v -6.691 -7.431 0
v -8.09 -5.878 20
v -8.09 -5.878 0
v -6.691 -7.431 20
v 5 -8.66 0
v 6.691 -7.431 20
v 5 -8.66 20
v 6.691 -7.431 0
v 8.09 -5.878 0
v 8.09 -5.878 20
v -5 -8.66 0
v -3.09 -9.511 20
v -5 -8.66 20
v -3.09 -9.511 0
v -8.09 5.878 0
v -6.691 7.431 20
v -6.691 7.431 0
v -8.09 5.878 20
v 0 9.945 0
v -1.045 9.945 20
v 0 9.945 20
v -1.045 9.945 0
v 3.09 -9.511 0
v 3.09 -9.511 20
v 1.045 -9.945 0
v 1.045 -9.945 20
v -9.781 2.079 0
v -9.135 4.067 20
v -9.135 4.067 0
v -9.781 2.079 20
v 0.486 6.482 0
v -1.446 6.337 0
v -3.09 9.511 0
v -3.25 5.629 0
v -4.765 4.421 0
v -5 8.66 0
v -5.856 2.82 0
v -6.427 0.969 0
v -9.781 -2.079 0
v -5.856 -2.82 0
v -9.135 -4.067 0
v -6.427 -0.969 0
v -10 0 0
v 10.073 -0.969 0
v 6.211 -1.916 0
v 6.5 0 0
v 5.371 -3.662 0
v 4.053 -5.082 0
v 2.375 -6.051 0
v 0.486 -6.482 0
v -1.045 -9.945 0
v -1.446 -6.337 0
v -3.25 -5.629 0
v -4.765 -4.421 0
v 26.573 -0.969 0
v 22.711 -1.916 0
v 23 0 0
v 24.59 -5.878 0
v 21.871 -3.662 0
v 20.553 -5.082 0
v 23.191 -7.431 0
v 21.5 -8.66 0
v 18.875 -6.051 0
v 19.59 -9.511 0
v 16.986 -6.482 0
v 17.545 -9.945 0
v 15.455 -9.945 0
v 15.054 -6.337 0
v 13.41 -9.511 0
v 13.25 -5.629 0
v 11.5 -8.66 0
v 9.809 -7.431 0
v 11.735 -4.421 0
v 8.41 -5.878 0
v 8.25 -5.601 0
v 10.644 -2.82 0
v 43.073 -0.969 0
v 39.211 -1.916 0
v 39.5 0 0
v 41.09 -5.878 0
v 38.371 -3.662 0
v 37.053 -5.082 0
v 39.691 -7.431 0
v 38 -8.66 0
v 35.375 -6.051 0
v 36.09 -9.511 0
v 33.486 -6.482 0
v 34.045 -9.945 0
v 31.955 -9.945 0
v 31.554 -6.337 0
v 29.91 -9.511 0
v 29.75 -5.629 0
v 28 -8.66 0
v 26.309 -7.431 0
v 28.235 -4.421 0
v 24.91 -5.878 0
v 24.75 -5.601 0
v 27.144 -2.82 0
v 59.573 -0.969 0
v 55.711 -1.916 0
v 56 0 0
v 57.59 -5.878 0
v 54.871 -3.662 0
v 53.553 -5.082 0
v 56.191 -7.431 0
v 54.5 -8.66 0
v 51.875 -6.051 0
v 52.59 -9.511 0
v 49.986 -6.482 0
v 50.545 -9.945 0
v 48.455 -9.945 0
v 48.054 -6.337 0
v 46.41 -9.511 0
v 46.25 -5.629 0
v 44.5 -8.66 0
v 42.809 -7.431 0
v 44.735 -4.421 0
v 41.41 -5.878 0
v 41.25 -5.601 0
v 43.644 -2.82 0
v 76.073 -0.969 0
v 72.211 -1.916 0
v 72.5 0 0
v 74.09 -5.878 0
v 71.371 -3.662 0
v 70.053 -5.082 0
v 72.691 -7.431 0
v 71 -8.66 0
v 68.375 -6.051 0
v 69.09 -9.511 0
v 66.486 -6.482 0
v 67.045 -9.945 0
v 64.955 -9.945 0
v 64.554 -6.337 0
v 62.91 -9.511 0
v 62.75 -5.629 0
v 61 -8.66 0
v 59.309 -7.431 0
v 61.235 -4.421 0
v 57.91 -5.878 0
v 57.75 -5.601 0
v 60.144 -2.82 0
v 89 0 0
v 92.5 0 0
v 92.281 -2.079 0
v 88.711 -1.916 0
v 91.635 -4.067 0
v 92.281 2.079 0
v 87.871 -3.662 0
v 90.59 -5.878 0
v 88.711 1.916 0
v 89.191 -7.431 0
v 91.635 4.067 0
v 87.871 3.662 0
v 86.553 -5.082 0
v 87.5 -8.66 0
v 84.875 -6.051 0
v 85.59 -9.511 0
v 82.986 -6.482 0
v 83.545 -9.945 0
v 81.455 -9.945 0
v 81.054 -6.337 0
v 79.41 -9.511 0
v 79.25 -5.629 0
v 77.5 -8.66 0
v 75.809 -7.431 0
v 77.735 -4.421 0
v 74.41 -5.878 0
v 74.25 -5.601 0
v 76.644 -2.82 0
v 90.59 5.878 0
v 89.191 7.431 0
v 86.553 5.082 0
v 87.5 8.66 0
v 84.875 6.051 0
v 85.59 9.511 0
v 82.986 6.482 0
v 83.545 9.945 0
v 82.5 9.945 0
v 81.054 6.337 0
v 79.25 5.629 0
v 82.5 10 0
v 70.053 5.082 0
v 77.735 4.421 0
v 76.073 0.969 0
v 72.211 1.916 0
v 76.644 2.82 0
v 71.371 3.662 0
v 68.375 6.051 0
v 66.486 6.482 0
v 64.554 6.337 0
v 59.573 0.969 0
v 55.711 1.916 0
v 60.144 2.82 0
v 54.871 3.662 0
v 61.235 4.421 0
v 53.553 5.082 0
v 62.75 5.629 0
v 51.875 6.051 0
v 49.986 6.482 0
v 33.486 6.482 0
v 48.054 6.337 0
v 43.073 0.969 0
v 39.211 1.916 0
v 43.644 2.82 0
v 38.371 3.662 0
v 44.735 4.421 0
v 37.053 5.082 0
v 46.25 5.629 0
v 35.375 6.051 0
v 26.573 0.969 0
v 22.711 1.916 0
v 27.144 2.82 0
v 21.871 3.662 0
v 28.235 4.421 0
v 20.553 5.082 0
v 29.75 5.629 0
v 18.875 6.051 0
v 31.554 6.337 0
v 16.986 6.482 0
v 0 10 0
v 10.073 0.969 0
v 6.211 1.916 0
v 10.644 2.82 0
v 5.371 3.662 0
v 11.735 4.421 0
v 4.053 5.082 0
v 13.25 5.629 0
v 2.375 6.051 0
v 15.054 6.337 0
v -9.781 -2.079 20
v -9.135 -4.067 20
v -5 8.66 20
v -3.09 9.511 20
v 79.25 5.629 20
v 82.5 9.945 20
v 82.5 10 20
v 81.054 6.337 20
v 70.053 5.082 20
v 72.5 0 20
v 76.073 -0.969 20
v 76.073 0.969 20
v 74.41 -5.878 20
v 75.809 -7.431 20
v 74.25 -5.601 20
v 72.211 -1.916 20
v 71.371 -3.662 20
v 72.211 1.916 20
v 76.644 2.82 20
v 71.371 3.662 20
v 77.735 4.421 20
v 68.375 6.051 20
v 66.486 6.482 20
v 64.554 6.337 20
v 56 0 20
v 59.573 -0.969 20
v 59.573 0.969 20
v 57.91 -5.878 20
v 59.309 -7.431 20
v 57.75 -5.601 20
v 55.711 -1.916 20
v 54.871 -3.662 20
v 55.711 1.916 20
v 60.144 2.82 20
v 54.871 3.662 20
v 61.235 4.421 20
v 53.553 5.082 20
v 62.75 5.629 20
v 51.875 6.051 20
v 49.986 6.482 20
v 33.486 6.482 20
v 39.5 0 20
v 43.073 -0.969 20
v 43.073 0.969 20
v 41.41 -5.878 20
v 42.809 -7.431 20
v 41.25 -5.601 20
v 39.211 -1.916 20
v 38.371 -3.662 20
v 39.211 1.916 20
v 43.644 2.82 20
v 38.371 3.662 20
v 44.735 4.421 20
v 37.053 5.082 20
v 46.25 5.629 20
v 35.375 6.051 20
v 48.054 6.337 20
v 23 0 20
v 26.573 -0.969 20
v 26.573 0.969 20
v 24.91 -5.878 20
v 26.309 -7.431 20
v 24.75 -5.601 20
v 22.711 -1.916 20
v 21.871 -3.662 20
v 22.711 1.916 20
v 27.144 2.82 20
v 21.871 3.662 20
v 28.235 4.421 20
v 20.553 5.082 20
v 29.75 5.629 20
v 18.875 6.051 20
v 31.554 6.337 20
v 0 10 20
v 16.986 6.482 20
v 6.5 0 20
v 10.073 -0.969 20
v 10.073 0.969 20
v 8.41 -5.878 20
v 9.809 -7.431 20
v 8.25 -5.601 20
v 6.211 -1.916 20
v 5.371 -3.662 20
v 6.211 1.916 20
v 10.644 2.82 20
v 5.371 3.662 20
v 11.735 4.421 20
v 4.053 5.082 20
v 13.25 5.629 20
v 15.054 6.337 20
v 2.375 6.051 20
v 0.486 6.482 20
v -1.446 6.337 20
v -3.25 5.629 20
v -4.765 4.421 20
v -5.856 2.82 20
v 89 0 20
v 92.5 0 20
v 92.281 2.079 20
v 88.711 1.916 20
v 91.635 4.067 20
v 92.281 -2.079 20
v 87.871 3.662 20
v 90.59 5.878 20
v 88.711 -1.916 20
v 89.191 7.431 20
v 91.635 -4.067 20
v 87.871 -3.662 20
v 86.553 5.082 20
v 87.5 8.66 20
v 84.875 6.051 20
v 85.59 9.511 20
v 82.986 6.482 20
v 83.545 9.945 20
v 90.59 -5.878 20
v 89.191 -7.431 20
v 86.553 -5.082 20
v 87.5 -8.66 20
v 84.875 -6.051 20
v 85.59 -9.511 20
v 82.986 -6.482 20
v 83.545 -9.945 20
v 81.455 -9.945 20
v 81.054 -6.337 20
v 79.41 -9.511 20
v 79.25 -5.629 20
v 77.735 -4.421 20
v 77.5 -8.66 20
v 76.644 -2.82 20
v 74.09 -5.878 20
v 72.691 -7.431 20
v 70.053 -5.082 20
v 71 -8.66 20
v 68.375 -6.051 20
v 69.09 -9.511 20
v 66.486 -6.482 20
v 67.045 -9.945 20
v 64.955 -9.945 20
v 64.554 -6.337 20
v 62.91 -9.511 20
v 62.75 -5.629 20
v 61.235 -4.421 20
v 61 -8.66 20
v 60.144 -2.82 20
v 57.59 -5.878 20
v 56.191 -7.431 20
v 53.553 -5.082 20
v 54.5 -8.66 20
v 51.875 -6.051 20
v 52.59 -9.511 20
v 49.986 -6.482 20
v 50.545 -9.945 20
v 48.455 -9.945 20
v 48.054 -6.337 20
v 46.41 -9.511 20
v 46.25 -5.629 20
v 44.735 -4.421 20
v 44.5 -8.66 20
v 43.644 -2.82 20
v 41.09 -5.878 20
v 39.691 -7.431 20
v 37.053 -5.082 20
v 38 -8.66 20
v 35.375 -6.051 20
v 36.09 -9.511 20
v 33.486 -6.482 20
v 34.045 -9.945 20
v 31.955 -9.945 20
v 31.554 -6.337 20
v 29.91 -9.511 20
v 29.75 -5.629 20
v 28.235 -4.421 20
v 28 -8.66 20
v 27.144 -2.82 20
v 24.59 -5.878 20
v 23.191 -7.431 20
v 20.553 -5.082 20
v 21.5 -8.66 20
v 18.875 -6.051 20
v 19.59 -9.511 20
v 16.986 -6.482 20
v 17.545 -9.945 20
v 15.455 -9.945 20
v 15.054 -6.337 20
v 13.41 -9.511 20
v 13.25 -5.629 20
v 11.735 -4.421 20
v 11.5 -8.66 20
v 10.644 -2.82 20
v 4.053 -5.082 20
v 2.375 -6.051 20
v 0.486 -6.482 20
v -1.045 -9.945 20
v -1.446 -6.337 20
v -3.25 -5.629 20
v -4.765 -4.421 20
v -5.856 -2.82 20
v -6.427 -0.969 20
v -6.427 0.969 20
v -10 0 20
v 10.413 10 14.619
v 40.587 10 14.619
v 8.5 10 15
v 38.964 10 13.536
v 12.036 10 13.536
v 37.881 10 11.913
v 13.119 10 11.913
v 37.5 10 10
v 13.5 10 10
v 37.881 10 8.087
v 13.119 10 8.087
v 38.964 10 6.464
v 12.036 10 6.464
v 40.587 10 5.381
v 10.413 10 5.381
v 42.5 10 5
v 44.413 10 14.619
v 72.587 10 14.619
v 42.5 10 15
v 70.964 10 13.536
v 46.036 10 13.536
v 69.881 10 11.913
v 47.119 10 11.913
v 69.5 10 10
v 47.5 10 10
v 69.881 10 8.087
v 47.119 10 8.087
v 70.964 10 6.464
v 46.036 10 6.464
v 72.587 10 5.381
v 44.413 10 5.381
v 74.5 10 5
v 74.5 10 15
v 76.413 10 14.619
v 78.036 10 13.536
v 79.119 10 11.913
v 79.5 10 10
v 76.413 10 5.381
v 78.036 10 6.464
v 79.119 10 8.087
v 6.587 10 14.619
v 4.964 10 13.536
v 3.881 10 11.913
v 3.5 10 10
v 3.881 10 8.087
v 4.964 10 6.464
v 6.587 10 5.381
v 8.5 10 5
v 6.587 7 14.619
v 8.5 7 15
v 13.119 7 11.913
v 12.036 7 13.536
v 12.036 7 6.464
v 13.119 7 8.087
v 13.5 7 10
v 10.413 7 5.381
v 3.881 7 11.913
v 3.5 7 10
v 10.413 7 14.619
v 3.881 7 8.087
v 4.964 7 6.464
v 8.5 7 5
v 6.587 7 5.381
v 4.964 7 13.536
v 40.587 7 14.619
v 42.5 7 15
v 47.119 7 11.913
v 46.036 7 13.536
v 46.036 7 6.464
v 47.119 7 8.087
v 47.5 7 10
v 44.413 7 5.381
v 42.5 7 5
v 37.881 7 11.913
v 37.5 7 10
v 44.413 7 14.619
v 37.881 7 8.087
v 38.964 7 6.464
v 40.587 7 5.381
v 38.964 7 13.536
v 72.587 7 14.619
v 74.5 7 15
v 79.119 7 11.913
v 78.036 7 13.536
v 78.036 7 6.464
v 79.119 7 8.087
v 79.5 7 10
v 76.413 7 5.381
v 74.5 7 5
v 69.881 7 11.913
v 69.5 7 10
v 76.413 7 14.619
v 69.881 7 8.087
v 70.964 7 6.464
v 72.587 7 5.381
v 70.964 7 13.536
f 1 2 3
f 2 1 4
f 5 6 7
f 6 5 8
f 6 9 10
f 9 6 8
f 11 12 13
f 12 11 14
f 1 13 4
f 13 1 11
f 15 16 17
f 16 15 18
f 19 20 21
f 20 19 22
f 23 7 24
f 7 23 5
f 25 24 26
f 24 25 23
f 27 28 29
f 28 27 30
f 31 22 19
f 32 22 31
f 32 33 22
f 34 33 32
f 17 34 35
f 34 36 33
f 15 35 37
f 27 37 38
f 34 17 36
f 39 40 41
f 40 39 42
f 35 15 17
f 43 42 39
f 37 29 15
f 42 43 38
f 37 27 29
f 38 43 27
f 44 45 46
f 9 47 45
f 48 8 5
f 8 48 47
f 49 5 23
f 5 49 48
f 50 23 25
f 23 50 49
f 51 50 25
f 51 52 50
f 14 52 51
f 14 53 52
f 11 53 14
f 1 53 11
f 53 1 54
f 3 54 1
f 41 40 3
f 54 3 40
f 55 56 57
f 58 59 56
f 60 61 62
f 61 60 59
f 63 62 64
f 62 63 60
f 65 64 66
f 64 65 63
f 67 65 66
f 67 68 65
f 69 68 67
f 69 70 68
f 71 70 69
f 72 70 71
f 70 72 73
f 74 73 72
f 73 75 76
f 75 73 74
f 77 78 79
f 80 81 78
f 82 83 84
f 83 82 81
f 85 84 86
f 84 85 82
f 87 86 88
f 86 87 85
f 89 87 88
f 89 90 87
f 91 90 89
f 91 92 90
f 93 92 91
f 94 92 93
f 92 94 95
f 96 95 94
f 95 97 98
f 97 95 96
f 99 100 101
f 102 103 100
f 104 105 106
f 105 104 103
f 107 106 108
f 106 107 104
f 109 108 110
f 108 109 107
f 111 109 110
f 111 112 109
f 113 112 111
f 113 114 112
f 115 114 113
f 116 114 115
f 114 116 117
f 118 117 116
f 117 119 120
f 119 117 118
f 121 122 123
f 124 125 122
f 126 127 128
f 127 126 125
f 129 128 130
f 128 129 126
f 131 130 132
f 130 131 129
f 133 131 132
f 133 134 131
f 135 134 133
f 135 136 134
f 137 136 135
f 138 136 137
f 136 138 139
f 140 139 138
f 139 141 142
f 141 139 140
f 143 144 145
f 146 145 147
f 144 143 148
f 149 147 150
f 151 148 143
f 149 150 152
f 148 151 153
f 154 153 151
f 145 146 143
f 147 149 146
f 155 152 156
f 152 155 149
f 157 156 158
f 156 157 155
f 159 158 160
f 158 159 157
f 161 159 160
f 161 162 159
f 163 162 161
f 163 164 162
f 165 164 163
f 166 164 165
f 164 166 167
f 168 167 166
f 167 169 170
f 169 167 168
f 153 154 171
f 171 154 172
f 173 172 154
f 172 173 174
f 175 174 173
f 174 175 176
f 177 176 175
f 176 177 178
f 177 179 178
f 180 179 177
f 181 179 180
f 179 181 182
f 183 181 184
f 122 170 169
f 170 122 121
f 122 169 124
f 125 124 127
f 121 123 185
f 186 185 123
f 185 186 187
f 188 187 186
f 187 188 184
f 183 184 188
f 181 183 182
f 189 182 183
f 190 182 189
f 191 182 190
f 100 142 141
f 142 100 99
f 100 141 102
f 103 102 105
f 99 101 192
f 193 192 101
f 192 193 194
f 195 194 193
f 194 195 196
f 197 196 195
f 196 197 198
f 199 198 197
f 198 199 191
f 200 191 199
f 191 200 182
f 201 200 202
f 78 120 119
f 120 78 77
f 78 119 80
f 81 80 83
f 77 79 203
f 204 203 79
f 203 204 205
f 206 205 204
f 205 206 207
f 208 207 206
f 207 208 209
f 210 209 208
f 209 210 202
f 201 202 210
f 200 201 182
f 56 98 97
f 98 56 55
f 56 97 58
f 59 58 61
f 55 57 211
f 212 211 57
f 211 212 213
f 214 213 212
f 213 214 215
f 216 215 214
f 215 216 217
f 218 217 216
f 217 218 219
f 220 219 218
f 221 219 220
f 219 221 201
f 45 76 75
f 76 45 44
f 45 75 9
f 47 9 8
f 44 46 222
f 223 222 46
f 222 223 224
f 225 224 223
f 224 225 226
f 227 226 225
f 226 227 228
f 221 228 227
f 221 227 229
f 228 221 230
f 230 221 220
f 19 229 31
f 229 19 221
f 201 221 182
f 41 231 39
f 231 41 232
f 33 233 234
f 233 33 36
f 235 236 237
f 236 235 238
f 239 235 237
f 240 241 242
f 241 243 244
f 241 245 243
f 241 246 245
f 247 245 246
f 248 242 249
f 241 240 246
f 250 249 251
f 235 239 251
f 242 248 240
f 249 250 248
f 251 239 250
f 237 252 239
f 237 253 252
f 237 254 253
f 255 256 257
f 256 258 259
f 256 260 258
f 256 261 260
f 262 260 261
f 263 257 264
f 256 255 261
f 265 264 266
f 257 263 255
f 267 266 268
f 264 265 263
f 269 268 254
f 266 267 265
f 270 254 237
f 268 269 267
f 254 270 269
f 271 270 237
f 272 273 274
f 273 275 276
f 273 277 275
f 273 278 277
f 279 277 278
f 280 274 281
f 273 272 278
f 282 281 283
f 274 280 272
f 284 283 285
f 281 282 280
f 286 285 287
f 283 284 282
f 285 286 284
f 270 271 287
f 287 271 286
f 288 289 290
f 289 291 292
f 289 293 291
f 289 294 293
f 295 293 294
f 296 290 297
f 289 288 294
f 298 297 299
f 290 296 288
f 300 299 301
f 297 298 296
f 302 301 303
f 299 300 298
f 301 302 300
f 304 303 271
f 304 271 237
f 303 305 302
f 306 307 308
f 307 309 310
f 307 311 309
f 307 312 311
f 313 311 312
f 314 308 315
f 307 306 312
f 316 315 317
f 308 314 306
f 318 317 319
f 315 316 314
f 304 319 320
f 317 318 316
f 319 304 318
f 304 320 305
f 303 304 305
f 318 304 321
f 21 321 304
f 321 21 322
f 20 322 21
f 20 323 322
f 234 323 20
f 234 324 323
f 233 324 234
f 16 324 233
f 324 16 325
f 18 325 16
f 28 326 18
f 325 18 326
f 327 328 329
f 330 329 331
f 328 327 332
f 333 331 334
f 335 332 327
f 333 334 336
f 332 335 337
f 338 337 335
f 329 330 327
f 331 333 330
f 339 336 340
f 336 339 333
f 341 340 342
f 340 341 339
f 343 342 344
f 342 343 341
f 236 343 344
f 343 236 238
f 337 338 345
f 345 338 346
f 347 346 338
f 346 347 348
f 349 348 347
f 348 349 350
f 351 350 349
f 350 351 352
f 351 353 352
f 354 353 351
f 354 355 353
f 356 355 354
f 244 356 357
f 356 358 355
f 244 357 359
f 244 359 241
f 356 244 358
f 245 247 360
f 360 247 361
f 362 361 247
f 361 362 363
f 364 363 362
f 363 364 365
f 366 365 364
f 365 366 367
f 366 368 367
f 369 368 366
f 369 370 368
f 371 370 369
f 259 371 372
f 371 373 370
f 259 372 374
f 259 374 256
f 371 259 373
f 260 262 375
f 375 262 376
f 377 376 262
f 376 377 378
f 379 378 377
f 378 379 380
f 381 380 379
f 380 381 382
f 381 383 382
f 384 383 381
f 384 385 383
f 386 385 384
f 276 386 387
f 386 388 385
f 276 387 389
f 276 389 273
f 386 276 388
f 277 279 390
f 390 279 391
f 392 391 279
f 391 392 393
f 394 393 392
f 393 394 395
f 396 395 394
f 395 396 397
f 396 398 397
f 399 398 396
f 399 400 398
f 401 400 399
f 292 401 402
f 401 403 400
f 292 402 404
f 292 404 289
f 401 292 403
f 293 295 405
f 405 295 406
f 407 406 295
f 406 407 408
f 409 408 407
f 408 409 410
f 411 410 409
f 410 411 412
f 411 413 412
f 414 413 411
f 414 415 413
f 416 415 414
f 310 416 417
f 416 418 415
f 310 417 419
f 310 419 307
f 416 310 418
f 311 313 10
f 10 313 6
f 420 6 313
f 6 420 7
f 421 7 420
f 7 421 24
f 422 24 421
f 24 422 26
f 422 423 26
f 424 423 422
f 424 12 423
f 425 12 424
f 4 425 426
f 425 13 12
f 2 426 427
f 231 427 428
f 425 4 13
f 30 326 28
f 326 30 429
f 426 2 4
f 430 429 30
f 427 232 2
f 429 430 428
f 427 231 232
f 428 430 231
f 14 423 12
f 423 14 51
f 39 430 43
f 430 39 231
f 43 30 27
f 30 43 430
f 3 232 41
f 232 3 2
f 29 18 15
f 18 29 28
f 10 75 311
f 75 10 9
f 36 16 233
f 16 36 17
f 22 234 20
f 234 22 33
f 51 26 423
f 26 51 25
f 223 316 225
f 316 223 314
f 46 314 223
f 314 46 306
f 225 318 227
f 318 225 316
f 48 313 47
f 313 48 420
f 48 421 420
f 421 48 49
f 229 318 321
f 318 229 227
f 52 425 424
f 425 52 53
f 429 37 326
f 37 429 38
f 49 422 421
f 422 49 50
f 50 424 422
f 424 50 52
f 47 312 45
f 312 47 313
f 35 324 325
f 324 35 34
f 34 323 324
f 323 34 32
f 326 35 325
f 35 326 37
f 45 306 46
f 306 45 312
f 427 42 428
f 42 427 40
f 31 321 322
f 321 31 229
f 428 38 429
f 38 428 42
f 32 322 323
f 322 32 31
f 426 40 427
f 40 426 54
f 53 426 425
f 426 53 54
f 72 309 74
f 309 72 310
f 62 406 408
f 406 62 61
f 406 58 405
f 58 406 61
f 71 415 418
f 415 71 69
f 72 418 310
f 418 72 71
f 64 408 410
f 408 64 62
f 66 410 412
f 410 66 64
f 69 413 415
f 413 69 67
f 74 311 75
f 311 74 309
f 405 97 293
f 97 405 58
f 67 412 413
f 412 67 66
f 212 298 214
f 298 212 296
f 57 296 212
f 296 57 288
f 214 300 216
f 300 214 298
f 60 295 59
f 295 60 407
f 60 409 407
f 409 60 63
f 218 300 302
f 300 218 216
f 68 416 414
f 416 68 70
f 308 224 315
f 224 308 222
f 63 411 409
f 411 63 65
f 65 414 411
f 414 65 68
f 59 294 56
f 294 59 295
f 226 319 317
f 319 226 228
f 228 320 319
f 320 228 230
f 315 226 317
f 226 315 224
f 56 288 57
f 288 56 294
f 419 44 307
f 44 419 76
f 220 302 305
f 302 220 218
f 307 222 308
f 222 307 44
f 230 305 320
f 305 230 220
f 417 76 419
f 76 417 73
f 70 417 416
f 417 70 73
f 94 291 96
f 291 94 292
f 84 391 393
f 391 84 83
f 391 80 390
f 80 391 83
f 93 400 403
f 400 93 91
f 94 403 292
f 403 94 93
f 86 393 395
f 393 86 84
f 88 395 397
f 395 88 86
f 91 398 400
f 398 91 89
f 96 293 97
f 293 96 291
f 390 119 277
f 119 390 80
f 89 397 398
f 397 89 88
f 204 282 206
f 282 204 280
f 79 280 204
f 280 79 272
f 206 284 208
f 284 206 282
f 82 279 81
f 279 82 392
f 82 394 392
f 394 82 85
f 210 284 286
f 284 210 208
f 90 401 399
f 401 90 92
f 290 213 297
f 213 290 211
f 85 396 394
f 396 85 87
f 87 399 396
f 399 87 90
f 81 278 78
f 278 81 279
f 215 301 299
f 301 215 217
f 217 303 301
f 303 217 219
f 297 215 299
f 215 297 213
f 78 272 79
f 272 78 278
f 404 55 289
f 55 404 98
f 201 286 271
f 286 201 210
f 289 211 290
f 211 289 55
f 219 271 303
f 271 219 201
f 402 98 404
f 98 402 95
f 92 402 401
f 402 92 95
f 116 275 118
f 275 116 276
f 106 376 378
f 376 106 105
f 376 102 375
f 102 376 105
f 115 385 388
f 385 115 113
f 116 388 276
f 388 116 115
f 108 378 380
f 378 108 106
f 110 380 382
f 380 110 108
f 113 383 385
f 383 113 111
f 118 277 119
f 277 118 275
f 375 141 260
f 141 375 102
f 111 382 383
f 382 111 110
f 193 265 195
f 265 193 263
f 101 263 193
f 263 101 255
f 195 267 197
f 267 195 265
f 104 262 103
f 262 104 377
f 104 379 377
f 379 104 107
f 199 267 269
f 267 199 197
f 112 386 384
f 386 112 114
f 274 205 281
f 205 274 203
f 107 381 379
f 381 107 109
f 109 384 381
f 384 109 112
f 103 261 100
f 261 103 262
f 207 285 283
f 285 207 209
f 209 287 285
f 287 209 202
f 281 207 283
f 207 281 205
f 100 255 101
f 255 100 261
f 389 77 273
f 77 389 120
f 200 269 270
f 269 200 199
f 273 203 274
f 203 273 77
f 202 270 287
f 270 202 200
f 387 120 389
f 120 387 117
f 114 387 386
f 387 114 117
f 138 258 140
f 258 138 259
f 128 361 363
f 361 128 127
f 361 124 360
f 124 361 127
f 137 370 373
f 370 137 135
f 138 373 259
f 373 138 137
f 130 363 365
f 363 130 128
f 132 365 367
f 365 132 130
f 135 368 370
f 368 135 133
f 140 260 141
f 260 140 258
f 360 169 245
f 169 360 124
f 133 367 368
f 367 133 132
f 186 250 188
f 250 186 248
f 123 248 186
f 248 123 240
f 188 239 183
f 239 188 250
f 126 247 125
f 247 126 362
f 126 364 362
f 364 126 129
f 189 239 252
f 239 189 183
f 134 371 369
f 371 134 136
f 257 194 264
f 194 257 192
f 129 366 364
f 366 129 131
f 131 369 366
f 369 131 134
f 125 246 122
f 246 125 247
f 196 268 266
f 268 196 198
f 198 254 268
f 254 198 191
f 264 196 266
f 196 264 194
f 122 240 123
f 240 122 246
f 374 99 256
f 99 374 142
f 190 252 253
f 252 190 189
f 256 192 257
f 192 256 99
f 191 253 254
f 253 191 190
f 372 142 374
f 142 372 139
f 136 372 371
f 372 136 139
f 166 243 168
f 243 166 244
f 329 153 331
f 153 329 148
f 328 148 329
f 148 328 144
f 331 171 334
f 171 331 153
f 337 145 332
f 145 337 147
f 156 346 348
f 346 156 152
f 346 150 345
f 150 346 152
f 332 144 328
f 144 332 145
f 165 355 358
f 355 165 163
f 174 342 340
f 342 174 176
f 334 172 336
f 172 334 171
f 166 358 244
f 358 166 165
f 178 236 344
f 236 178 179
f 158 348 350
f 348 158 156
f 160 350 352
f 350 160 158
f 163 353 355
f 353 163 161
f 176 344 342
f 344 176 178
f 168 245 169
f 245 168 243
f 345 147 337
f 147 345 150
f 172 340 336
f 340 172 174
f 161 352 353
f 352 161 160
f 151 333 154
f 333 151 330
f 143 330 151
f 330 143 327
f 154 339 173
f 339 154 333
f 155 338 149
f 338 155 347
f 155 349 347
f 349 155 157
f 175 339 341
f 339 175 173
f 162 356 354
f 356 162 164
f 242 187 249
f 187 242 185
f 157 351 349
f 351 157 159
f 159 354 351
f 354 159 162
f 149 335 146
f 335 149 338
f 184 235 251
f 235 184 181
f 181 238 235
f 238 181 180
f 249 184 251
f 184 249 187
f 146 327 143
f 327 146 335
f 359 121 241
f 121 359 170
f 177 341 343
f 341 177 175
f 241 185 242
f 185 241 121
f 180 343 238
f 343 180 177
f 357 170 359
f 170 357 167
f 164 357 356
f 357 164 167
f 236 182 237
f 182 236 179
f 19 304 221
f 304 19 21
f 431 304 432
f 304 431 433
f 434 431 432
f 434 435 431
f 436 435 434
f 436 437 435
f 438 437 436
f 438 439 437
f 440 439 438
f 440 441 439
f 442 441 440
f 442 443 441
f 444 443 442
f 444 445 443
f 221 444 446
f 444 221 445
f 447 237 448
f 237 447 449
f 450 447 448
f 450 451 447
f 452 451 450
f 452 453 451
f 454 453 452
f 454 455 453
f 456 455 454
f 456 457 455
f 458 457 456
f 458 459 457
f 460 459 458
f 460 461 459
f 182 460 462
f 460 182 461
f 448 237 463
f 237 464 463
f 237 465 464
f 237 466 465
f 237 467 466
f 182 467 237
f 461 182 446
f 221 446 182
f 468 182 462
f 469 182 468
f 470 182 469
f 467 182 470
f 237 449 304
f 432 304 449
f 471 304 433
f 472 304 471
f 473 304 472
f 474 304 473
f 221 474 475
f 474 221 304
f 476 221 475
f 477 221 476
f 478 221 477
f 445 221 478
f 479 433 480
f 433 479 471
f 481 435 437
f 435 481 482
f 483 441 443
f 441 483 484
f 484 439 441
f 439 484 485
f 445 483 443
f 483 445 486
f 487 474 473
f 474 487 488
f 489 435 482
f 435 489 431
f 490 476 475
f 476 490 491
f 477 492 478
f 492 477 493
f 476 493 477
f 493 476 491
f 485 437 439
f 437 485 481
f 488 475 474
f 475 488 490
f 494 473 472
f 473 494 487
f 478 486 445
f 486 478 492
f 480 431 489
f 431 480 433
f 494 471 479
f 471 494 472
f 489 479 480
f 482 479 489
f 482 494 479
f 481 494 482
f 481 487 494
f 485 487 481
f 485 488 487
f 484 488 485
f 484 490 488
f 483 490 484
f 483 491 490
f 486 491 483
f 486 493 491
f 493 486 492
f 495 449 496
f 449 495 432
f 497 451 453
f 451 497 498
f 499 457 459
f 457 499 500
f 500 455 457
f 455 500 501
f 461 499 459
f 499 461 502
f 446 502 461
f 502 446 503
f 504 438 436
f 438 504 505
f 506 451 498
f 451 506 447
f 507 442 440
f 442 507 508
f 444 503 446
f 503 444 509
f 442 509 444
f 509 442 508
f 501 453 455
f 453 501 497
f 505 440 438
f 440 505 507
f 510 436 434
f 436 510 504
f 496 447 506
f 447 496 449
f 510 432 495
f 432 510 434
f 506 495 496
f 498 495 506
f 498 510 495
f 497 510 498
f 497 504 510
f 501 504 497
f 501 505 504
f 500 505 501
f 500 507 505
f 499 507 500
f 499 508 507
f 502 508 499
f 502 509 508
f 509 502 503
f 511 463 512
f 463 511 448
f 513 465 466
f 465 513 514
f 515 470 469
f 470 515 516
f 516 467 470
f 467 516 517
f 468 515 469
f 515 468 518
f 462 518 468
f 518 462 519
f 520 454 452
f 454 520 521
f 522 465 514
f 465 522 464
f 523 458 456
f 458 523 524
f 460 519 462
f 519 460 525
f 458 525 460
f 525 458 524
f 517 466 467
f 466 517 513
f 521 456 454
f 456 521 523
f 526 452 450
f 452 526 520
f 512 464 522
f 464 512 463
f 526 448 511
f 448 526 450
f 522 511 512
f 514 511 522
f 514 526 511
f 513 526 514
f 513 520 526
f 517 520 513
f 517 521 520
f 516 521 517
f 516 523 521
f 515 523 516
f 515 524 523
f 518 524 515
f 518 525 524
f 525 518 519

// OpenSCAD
pens = 6;
penDiameter = 13;
magnetDiameter = 10;
magnetHeight = 2;

module penHolder (number) {
    translate([number * 16.5, 0, 0]) {        
        difference() {
            if (pens > 1) cylinder(20, 10, 10, 0);
            else {
                translate([-10, -10, 0]) {
                    cube([20, 20, 20], 0);
                }
            }
            translate([0,0, -3])
            cylinder(24, penDiameter/2, penDiameter/2, 0);
        }
    }
}

module complete (number) {
    translate([number * 16.5 + 6, 5, 0]) {
        cube([4, 2, 20], 0);
    }
}


module magnet (number) {
    simplyfiedPens = pens - 1;
    holePosition = number ? ((((simplyfiedPens * 16.5) / magnet) + 6.5) * number) : 0;
    finalHolePosition = number == magnet - 1 ? (simplyfiedPens * 16.5) - 16.5 : holePosition;
    
    translate([finalHolePosition + (pens > 1 ? 8.5 : 16.5), 7, 10]) {
        rotate([-90, 0, 0]) {
            cylinder(magnetHeight+1.5, magnetDiameter/2, magnetDiameter/2, 0);
        }
    }
}

magnets = [1,1,2,2,2,2,3,3,3,4,4];
magnet = magnets[pens > 10 ? 10 : pens];

difference() {
    union() {
        for (i=[0:pens-1]) penHolder(i);
        if (pens > 1) for (i=[0:pens-2]) complete(i);
        translate([0, 7, 0])
        cube([(pens-1)*16.5, magnetHeight + 1, 20], 0);
    }
    
    for (i=[0:magnet-1]) magnet(i);
}
